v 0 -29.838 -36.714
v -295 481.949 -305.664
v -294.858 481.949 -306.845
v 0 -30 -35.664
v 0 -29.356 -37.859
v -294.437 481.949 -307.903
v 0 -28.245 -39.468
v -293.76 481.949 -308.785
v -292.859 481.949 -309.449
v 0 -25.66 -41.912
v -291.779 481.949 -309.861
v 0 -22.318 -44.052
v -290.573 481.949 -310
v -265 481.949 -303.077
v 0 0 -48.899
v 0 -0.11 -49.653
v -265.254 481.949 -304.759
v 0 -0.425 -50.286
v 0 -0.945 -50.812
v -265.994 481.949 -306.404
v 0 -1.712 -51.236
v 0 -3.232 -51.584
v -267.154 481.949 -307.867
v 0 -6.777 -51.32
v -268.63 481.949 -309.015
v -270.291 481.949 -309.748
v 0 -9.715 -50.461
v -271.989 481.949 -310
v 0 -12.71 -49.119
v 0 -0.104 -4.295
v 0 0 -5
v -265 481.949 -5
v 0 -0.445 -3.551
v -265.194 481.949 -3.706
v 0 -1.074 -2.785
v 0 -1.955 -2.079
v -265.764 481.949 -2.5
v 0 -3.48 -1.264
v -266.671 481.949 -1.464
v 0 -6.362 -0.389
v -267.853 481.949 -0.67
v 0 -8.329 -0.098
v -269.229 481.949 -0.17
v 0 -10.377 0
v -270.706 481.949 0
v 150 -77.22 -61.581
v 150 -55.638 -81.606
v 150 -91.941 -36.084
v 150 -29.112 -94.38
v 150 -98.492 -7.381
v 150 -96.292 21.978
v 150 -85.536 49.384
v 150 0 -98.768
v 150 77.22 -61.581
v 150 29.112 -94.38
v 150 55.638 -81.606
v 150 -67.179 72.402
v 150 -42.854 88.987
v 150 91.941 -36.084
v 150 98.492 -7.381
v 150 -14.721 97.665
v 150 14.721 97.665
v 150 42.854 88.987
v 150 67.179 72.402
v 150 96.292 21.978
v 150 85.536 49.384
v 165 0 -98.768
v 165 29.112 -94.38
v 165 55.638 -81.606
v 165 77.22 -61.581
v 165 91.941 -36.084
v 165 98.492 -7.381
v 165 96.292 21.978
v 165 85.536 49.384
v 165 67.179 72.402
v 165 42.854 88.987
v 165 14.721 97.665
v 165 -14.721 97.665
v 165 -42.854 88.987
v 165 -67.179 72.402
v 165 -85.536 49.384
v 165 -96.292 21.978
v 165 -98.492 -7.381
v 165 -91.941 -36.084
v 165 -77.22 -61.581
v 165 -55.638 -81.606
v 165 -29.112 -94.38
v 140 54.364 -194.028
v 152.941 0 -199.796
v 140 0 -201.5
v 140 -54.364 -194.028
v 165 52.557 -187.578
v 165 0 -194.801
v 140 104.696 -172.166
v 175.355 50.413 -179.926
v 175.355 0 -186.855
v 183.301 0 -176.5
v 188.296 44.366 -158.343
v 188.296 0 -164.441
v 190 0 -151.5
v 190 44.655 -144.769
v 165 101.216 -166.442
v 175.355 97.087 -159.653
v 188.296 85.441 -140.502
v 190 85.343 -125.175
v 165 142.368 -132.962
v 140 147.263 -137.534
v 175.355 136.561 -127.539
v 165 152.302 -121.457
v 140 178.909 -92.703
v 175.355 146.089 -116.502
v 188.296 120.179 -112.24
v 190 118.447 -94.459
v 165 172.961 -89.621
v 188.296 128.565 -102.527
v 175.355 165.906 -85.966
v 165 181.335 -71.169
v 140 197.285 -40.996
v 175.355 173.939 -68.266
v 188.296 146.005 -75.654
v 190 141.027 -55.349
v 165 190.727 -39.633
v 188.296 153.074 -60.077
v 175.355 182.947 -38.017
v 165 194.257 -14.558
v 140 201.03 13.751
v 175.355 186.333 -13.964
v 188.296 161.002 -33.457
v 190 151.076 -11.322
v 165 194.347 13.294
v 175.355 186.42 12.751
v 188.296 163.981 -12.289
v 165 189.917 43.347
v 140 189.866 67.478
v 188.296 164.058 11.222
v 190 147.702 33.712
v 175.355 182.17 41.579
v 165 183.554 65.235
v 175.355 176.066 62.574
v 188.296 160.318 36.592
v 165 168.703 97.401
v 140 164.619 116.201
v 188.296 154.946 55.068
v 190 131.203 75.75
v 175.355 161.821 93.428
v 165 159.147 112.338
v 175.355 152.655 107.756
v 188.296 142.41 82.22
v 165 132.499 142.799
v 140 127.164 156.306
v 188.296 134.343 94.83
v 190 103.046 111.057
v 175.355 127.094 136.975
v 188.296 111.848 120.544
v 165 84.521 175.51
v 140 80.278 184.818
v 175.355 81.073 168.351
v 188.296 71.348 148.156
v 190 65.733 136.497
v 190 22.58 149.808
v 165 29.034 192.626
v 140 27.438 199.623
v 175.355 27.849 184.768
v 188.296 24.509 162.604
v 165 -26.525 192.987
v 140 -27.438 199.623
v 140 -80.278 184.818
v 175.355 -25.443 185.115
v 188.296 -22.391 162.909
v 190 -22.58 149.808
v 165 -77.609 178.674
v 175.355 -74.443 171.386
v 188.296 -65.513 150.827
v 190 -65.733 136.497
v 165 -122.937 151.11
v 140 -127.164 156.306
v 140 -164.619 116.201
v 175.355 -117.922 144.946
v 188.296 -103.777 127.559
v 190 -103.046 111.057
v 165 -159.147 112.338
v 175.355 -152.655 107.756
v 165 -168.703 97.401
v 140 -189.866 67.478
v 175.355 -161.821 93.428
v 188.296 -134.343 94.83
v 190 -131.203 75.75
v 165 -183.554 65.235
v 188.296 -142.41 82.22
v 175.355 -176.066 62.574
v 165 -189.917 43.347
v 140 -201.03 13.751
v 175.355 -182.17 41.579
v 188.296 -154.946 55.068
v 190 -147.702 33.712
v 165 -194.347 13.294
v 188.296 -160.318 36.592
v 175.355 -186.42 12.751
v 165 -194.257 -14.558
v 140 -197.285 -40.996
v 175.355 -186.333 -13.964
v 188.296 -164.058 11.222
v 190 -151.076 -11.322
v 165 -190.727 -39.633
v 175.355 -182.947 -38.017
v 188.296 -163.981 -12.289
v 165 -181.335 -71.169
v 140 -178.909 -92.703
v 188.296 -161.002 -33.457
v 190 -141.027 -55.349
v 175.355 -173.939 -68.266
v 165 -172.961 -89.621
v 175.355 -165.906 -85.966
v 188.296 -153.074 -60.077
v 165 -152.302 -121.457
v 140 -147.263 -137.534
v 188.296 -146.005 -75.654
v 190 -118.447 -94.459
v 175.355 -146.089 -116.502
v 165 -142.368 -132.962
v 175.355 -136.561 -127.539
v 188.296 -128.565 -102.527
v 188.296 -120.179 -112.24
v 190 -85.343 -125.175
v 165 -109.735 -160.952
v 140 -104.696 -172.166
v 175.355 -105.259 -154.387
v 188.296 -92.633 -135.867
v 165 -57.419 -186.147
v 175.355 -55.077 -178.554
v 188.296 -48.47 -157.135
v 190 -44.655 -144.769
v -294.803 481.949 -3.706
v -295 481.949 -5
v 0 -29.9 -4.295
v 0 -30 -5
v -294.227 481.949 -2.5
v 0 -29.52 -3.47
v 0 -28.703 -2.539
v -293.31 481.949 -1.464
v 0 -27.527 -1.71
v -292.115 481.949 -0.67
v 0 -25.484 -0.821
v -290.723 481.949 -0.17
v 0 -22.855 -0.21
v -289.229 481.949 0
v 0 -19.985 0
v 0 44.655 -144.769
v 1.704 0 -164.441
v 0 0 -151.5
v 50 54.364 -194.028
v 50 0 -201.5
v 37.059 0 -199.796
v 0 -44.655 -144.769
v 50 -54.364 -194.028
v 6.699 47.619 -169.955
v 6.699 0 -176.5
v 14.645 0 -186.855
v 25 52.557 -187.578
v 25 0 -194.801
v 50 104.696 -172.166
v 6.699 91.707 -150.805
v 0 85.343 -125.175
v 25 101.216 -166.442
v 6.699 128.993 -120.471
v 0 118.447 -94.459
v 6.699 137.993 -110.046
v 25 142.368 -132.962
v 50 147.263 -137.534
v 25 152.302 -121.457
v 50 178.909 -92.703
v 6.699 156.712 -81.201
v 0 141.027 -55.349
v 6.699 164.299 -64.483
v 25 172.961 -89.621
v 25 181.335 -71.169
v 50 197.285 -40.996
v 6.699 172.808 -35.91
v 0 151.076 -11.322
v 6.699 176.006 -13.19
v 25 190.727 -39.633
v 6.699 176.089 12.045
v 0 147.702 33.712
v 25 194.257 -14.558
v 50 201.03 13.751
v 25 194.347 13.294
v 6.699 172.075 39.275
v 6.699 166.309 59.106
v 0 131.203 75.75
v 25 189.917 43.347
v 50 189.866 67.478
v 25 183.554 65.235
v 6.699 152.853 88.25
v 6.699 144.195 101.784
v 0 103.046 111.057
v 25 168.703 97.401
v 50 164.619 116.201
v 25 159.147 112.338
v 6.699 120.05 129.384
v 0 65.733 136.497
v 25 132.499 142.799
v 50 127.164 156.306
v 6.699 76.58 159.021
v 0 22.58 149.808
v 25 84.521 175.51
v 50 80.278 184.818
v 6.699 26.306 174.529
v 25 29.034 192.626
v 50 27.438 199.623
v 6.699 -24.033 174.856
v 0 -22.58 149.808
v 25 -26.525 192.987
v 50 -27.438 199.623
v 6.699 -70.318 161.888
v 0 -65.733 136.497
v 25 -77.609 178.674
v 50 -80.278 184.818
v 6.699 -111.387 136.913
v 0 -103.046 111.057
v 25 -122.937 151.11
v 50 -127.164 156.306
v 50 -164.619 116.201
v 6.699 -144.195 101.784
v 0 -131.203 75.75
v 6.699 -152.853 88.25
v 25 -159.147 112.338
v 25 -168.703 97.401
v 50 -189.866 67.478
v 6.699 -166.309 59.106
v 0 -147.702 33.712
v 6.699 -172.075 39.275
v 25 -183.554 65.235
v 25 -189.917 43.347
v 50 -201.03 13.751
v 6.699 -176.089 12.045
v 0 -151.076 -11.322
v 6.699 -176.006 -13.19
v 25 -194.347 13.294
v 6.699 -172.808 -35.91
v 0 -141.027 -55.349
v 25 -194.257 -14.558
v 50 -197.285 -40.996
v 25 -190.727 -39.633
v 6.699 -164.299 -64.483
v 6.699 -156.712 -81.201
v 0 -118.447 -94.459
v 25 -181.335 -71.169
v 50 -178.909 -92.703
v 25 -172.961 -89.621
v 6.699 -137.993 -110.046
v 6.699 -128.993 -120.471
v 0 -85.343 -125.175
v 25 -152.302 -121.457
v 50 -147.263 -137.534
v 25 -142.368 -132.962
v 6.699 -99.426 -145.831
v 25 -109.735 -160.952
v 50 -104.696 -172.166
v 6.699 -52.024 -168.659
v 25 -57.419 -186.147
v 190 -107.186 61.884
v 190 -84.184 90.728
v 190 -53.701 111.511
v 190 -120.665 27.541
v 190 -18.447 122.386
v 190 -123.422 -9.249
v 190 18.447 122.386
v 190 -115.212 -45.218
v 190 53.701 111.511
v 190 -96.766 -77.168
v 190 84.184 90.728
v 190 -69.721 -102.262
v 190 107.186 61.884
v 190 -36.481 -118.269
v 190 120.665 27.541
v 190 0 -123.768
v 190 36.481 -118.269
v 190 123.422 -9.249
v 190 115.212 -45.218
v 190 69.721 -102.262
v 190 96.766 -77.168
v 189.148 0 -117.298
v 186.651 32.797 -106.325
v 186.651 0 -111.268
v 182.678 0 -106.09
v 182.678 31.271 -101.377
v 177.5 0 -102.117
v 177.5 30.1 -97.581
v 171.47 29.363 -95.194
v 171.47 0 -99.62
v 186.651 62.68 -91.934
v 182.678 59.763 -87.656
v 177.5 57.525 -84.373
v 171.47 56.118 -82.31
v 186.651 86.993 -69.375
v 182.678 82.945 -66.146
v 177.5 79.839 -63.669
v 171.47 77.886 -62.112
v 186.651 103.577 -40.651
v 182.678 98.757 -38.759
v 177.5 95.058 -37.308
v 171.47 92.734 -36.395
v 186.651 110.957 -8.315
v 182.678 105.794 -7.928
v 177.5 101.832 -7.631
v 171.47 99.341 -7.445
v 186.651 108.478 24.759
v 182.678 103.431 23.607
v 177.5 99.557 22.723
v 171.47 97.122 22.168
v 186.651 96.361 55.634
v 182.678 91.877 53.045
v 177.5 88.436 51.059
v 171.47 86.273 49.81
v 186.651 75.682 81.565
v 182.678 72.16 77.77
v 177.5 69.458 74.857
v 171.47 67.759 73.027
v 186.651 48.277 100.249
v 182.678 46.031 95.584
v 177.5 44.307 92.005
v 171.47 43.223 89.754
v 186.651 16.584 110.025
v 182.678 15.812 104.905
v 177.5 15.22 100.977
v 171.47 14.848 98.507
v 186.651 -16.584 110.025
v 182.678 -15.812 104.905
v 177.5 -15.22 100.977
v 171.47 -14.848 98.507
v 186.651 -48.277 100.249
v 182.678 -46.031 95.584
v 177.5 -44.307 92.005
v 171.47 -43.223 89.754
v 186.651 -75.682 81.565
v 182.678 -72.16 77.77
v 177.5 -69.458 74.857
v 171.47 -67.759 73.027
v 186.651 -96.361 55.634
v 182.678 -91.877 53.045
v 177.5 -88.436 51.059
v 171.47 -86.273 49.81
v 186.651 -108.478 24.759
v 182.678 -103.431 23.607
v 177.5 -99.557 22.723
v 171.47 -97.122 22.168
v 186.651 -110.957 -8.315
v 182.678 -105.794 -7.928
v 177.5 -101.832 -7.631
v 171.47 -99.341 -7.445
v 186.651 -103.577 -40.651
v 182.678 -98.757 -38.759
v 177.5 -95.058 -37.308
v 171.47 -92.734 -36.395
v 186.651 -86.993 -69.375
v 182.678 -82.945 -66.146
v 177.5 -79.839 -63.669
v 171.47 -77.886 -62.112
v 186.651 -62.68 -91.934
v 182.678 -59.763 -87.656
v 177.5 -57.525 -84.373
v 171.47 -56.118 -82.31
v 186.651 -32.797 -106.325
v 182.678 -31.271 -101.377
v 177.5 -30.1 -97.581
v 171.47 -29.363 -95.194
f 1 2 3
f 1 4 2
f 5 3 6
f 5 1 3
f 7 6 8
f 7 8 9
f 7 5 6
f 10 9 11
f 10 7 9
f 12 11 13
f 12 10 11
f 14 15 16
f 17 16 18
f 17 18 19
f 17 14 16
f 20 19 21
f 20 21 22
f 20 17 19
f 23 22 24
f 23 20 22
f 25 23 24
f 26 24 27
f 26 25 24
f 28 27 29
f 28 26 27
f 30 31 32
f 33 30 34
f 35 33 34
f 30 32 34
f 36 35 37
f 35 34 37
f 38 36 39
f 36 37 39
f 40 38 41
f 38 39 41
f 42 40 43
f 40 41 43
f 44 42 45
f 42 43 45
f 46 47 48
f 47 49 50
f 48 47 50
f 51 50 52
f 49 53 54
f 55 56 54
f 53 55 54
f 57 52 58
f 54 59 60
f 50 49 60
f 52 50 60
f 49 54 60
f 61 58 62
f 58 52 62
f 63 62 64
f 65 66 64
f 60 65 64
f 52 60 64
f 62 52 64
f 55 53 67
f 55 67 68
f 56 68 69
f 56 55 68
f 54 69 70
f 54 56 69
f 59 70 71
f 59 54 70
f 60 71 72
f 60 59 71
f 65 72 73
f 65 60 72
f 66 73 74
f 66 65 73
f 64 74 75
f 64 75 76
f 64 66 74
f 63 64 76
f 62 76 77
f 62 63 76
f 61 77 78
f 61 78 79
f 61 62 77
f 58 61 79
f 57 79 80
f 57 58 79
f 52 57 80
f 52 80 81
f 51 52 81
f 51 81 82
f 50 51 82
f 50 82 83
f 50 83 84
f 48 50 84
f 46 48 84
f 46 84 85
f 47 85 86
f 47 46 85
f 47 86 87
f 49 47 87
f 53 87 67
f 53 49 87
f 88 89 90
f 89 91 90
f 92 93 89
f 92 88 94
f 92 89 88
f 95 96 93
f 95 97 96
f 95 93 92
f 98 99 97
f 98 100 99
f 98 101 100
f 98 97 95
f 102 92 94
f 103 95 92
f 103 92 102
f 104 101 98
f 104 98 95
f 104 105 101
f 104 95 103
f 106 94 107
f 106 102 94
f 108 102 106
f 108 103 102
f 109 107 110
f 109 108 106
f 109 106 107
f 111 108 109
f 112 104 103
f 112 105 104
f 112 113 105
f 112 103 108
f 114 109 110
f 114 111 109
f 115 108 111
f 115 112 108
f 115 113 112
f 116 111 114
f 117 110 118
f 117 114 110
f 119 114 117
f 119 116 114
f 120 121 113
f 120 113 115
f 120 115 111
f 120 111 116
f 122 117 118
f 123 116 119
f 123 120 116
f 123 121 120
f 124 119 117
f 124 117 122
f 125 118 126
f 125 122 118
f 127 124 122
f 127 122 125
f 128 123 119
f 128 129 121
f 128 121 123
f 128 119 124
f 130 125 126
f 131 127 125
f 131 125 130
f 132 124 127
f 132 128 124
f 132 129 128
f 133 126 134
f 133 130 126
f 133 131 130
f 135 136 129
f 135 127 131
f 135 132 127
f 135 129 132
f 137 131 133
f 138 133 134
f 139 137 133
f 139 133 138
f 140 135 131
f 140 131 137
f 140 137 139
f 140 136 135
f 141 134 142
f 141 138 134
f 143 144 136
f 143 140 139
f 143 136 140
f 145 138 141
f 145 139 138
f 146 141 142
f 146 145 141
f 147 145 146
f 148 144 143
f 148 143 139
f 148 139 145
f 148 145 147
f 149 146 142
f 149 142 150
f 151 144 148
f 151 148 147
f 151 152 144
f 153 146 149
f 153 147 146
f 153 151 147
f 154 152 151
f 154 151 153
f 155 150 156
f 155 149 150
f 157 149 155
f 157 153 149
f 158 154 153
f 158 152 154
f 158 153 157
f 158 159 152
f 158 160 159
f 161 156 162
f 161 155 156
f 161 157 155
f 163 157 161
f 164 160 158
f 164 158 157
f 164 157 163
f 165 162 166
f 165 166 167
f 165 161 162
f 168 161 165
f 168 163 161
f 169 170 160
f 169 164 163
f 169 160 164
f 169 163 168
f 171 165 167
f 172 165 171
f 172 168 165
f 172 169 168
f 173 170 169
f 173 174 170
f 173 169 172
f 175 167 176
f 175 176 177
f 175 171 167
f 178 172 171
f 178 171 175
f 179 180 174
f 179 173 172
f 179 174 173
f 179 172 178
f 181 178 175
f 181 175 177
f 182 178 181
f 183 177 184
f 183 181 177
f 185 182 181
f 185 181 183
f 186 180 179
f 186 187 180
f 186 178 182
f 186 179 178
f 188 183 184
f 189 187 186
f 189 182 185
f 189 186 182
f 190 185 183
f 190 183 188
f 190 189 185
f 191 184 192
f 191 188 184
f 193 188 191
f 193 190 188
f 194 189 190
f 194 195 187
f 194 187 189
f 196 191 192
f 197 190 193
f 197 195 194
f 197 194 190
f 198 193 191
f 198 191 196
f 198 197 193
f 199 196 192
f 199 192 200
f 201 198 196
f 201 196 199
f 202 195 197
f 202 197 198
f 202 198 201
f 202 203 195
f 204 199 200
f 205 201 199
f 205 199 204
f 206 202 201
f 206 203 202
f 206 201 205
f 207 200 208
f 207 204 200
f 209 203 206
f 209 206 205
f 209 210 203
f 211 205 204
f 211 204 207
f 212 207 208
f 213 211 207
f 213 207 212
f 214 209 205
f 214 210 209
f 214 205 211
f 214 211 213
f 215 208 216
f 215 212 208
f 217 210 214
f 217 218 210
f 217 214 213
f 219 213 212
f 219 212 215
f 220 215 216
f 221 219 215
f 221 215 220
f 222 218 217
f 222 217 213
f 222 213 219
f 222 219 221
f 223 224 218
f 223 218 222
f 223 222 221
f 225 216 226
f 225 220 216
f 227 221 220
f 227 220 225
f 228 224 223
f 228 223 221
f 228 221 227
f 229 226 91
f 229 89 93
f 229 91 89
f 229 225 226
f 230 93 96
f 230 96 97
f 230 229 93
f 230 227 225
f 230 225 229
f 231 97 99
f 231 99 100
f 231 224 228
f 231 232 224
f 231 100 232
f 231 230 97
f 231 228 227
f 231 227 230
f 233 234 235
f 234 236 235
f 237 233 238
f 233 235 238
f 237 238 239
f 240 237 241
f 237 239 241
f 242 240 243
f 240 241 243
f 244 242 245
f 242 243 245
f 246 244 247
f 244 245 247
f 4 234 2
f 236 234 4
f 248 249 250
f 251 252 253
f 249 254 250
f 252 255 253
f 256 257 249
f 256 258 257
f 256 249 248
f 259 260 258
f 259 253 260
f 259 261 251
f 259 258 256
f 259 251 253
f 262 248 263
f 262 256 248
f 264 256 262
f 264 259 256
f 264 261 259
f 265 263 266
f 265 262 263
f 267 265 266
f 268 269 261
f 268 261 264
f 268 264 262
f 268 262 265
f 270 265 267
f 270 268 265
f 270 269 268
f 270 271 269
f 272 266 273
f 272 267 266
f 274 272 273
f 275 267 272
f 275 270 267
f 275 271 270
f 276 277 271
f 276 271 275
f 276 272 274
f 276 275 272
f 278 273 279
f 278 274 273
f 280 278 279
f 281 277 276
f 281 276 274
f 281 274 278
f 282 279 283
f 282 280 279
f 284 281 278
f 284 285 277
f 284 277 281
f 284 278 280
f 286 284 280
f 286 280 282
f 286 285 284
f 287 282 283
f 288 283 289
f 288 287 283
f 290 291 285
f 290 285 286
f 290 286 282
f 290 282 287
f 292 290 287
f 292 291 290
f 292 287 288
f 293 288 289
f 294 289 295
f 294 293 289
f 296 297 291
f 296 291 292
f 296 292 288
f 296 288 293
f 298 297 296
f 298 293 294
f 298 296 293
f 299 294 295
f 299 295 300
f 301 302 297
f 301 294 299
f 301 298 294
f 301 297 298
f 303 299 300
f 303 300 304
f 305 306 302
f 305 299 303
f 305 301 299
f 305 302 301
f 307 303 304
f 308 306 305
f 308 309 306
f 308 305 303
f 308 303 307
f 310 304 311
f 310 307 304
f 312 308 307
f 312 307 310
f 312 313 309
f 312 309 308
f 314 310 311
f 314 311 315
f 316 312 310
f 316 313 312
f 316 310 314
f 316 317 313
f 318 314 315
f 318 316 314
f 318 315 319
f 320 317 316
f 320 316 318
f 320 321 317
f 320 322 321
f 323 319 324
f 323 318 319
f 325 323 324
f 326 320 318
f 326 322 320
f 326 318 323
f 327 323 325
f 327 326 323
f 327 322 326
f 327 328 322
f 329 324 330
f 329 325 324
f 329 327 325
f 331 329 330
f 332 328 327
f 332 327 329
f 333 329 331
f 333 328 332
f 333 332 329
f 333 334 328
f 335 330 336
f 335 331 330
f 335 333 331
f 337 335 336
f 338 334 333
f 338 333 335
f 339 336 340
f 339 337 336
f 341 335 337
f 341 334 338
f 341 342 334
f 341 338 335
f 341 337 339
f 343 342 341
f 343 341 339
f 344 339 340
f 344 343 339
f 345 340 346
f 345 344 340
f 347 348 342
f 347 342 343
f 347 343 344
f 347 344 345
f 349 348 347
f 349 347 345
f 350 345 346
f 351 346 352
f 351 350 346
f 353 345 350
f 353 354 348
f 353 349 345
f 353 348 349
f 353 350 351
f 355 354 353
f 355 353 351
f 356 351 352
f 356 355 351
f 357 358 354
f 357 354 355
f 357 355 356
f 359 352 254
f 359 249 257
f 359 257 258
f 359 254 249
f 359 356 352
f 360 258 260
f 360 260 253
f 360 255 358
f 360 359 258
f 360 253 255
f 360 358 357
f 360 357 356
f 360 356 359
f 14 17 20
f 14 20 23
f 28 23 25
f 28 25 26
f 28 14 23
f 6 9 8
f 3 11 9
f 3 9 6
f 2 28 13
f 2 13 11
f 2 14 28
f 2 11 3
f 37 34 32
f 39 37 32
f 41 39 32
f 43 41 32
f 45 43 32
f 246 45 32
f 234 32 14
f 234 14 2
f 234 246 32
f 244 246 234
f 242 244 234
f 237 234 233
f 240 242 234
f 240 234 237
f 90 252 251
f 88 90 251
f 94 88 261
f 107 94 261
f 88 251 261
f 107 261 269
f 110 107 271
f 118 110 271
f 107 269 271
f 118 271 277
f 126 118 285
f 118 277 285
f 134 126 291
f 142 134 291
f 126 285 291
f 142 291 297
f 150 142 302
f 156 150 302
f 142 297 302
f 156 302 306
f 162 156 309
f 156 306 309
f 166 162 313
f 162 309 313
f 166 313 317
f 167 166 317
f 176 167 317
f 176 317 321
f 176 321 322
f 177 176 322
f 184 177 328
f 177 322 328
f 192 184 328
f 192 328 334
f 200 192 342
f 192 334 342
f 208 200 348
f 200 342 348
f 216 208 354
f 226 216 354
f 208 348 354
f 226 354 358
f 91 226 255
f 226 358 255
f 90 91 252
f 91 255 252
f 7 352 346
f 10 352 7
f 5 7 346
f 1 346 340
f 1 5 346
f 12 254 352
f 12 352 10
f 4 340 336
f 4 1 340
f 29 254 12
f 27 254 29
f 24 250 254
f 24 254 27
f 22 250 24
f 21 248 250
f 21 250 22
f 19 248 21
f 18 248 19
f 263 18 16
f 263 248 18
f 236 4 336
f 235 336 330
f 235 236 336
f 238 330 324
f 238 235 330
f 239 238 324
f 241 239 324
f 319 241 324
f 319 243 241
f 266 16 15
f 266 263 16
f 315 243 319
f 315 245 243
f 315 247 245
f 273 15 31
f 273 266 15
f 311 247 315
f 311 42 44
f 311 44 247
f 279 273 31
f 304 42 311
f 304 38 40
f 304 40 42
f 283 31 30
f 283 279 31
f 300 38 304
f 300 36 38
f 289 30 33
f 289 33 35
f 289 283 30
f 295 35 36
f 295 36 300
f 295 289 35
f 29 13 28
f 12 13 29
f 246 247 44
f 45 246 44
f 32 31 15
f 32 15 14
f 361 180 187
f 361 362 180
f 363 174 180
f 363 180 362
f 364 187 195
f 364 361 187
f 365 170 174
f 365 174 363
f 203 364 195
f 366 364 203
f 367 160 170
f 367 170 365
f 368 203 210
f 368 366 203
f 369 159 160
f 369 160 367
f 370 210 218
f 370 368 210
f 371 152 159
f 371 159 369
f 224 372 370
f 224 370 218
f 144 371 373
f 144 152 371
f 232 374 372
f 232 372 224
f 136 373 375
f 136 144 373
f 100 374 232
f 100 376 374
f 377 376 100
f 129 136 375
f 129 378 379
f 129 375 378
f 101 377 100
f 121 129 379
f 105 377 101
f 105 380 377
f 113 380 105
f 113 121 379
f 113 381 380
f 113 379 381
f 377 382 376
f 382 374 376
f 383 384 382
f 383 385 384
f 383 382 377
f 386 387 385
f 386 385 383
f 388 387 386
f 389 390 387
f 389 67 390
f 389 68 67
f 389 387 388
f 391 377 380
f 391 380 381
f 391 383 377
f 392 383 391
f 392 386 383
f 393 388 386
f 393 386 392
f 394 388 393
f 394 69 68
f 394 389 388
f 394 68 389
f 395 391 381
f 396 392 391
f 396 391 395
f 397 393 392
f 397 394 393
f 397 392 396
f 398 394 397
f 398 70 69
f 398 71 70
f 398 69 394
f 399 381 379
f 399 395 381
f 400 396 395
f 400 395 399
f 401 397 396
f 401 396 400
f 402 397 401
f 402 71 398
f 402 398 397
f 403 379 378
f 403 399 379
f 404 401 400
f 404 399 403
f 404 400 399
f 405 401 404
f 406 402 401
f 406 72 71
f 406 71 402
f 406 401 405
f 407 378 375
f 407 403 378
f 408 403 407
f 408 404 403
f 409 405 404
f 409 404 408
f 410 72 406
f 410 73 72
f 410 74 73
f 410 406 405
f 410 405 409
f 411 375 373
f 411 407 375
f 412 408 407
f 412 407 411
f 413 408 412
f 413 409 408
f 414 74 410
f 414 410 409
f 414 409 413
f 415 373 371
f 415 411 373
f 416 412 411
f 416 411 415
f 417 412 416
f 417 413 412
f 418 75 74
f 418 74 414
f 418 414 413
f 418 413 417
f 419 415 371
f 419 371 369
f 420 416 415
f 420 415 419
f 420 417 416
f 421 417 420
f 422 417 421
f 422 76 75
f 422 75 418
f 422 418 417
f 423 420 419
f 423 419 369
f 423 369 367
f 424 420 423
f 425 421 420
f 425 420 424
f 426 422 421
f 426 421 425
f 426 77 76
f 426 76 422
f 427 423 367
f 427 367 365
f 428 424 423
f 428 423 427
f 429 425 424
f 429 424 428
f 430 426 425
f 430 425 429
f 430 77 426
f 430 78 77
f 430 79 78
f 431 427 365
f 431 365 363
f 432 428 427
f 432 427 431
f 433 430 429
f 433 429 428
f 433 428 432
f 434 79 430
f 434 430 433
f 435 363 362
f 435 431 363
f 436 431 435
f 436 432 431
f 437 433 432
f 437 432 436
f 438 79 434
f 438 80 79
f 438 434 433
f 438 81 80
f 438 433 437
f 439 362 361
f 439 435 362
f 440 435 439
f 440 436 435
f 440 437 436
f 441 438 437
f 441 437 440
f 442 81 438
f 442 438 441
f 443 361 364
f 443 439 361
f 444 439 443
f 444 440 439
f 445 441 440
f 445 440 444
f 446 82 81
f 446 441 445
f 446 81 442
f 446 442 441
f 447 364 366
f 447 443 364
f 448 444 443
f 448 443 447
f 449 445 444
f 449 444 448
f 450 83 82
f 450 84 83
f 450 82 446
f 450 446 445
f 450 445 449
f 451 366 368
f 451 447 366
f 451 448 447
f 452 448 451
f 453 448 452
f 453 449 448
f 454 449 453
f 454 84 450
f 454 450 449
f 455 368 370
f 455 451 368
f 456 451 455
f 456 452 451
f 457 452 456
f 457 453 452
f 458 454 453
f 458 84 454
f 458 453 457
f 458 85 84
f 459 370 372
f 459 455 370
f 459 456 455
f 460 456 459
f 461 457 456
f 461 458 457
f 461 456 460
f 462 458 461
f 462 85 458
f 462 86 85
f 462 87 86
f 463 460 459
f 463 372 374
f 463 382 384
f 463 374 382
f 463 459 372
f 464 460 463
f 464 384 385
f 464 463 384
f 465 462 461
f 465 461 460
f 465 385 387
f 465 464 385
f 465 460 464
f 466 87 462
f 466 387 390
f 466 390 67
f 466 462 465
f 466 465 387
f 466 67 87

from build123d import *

# Parameters (mm, degrees)
SKETCH1_R           = 201.5
SKETCH1_R_2         = 98.768091278
BOSS_EXTRUDE1_DEPTH = 190
SKETCH2_R           = 98.768091278
BOSS_EXTRUDE2_DEPTH = 150
FILLET1_R           = 50
FILLET2_R           = 25
BOSS_EXTRUDE3_DEPTH = 310
CUT_EXTRUDE5_DEPTH  = 300
FILLET3_R           = 5


with BuildPart() as part:
    # Sketch1 → Boss-Extrude1 (new body)
    with BuildSketch(Plane(origin=(0, 0, 0), x_dir=(0, 0, -1), z_dir=(1, 0, 0))):
        Circle(SKETCH1_R)
        Circle(SKETCH1_R_2, mode=Mode.SUBTRACT)
    extrude(amount=BOSS_EXTRUDE1_DEPTH)

    # Sketch2 → Boss-Extrude2 (add)
    with BuildSketch(Plane.ZY):
        Circle(SKETCH2_R)
    extrude(amount=-BOSS_EXTRUDE2_DEPTH)

    # Fillet1
    fillet1_edges = [part.edges().sort_by_distance(p)[0] for p in [
        (0, 0, 201.5),
        (190, 0, 201.5),
    ]]
    fillet(fillet1_edges, radius=FILLET1_R)

    # Fillet2
    fillet2_edges = [part.edges().sort_by_distance(p)[0] for p in [
        (190, 0, 98.768091278),
    ]]
    fillet(fillet2_edges, radius=FILLET2_R)

    # Sketch4 → Boss-Extrude3 (add)
    with BuildSketch(Plane.XY):
        Polygon((0, 0), (-265, 481.949167444), (-295, 481.949167444), (0, -30), align=None)
    extrude(amount=-BOSS_EXTRUDE3_DEPTH)

    # Sketch5 → Cut-Extrude5 (cut)
    with BuildSketch(Plane.ZY.offset(300)):
        Polygon((-310, 481.949167444), (-40, -30), (-310, -30), align=None)
    extrude(amount=-CUT_EXTRUDE5_DEPTH, mode=Mode.SUBTRACT)

    # Fillet3
    fillet3_edges = [part.edges().sort_by_distance(p)[0] for p in [
        (-132.5, 240.974583722, 0),
        (-147.5, 225.974583722, 0),
        (-147.5, 225.974583722, -175),
        (-132.5, 240.974583722, -182.910941667),
    ]]
    fillet(fillet3_edges, radius=FILLET3_R)


solid = part.part
